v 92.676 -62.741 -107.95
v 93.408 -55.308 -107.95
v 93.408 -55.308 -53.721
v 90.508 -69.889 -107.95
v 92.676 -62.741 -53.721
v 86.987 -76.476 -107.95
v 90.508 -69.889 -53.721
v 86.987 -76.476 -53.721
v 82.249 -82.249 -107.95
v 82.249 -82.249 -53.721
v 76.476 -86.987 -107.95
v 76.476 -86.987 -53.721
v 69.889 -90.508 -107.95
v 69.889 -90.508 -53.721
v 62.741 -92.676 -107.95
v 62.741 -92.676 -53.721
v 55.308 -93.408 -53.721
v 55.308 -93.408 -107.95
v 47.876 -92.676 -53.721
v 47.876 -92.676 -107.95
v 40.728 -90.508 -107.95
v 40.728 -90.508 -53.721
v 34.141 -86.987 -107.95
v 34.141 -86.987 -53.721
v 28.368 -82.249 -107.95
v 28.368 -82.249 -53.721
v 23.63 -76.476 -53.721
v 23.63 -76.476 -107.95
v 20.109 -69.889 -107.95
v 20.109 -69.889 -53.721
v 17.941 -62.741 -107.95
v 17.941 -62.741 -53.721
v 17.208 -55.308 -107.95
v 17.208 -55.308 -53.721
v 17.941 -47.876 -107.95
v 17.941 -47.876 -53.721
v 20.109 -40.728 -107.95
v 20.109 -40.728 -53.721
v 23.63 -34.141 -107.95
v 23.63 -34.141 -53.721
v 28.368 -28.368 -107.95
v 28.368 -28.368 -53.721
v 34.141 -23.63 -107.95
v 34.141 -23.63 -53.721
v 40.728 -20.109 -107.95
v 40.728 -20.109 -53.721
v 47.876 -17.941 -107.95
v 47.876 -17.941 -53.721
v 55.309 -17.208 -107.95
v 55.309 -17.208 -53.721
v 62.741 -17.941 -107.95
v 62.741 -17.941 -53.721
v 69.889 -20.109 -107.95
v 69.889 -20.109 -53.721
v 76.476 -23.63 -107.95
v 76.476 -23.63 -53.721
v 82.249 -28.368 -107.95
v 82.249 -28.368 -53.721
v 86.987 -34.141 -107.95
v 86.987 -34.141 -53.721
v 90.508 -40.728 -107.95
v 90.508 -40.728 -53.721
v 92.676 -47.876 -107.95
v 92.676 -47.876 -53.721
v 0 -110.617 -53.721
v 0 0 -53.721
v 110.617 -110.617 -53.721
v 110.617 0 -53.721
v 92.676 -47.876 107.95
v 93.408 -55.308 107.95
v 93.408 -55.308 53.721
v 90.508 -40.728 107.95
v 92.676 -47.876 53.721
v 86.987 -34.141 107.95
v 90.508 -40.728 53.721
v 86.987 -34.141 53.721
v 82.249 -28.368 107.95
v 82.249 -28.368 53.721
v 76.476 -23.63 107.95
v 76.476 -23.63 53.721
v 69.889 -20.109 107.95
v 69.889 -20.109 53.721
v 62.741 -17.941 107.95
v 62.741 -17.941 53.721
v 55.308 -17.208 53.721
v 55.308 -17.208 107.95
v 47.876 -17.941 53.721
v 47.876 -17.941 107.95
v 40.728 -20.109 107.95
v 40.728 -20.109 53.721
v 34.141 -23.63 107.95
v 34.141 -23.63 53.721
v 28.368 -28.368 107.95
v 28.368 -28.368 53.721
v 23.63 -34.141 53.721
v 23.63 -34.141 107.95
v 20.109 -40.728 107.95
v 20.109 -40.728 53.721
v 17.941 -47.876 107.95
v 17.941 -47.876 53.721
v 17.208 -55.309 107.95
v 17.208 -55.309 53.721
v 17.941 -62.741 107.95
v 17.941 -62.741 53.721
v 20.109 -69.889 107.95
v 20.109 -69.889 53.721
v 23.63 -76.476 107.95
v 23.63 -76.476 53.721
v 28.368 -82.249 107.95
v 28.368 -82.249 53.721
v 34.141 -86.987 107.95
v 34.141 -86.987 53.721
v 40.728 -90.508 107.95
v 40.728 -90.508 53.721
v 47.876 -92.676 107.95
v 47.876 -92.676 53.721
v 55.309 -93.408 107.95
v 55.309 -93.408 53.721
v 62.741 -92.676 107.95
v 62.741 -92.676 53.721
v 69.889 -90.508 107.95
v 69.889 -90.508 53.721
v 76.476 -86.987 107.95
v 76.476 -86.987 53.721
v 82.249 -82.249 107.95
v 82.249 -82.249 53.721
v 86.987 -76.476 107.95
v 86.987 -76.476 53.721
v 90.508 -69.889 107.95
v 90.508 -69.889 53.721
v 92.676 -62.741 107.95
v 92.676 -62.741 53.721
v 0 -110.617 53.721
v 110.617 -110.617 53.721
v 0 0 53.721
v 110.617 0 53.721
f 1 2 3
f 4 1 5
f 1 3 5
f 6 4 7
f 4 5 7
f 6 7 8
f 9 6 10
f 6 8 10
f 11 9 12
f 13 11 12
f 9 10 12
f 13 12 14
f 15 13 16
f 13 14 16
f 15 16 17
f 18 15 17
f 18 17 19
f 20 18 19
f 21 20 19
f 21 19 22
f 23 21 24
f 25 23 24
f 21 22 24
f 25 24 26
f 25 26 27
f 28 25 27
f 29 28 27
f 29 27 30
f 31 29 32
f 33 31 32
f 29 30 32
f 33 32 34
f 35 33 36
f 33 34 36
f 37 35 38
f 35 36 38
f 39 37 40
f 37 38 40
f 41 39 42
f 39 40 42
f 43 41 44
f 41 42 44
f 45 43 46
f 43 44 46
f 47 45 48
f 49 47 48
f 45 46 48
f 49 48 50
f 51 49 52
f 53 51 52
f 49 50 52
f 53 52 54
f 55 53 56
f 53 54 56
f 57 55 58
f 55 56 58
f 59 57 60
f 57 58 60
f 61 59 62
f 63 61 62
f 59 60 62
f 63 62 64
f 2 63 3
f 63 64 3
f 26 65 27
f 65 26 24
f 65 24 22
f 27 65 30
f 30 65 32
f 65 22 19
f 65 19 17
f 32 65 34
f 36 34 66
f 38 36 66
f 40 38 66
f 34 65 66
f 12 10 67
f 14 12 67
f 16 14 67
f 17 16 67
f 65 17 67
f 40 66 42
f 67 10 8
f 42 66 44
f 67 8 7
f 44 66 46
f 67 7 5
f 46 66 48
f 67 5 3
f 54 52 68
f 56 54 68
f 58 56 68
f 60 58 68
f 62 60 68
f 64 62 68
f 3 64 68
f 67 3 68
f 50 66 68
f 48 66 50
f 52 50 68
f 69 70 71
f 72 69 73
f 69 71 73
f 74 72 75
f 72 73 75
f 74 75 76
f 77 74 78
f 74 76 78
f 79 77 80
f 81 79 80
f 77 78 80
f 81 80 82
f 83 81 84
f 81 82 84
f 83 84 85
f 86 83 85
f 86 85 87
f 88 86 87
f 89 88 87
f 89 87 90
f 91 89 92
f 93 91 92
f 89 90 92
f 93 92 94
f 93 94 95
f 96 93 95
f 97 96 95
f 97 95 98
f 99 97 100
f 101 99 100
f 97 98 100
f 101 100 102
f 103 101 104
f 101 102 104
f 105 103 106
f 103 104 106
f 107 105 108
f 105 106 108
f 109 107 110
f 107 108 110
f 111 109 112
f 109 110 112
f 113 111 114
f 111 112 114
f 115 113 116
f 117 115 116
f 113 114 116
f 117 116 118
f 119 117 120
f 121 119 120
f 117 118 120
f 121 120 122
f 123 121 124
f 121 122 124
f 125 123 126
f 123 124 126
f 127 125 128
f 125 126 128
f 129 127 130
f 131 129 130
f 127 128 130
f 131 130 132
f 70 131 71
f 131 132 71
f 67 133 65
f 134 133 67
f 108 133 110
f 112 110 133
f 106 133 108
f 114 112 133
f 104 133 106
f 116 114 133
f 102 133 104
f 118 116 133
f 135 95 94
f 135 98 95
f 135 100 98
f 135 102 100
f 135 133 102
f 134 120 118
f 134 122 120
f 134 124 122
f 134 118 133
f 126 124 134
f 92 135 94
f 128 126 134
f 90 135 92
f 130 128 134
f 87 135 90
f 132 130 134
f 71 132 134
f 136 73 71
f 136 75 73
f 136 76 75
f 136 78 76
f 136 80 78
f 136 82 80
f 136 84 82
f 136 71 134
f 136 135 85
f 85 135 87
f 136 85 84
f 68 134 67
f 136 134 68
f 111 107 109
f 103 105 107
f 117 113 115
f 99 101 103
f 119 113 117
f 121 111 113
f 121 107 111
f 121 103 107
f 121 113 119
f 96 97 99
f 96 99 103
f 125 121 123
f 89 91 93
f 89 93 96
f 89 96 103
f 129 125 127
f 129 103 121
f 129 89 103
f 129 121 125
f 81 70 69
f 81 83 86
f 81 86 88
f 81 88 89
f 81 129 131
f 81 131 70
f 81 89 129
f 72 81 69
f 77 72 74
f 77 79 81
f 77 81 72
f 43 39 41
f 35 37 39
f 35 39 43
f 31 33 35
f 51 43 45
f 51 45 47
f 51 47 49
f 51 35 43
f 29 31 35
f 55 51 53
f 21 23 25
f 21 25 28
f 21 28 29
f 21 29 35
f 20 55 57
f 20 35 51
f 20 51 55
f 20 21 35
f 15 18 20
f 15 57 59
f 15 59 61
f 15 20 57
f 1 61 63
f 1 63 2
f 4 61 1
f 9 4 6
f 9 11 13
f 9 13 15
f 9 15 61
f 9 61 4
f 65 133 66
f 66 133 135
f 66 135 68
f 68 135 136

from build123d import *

# Parameters (mm, degrees)
F0_W          = 110.617
F0_H          = 110.617
F1_DEPTH      = 53.721
F1_DEPTH_BACK = 53.721
F2_R          = 38.1
F3_DEPTH      = 54.229
F4_R          = 38.1
F5_DEPTH      = 54.229


with BuildPart() as f1:
    # F0 (on Top) → F1 (new body, two sides)
    with BuildSketch(Plane.XY) as f1_sk:
        with Locations((55.3085, -55.3085)):
            Rectangle(F0_W, F0_H)
    extrude(amount=F1_DEPTH)
    extrude(f1_sk.sketch, amount=-F1_DEPTH_BACK)

    # F2 (on face) → F3 (join)
    with BuildSketch(Plane.XY.offset(53.721)):
        with Locations((55.3085, -55.3085)):
            Circle(F2_R)
    extrude(amount=F3_DEPTH)

    # F4 (on face) → F5 (join)
    with BuildSketch(Plane(origin=(0, 0, -53.721), x_dir=(1, 0, 0), z_dir=(0, 0, -1))):
        with Locations((55.3085, 55.3085)):
            Circle(F4_R)
    extrude(amount=F5_DEPTH)


solid = f1.part
